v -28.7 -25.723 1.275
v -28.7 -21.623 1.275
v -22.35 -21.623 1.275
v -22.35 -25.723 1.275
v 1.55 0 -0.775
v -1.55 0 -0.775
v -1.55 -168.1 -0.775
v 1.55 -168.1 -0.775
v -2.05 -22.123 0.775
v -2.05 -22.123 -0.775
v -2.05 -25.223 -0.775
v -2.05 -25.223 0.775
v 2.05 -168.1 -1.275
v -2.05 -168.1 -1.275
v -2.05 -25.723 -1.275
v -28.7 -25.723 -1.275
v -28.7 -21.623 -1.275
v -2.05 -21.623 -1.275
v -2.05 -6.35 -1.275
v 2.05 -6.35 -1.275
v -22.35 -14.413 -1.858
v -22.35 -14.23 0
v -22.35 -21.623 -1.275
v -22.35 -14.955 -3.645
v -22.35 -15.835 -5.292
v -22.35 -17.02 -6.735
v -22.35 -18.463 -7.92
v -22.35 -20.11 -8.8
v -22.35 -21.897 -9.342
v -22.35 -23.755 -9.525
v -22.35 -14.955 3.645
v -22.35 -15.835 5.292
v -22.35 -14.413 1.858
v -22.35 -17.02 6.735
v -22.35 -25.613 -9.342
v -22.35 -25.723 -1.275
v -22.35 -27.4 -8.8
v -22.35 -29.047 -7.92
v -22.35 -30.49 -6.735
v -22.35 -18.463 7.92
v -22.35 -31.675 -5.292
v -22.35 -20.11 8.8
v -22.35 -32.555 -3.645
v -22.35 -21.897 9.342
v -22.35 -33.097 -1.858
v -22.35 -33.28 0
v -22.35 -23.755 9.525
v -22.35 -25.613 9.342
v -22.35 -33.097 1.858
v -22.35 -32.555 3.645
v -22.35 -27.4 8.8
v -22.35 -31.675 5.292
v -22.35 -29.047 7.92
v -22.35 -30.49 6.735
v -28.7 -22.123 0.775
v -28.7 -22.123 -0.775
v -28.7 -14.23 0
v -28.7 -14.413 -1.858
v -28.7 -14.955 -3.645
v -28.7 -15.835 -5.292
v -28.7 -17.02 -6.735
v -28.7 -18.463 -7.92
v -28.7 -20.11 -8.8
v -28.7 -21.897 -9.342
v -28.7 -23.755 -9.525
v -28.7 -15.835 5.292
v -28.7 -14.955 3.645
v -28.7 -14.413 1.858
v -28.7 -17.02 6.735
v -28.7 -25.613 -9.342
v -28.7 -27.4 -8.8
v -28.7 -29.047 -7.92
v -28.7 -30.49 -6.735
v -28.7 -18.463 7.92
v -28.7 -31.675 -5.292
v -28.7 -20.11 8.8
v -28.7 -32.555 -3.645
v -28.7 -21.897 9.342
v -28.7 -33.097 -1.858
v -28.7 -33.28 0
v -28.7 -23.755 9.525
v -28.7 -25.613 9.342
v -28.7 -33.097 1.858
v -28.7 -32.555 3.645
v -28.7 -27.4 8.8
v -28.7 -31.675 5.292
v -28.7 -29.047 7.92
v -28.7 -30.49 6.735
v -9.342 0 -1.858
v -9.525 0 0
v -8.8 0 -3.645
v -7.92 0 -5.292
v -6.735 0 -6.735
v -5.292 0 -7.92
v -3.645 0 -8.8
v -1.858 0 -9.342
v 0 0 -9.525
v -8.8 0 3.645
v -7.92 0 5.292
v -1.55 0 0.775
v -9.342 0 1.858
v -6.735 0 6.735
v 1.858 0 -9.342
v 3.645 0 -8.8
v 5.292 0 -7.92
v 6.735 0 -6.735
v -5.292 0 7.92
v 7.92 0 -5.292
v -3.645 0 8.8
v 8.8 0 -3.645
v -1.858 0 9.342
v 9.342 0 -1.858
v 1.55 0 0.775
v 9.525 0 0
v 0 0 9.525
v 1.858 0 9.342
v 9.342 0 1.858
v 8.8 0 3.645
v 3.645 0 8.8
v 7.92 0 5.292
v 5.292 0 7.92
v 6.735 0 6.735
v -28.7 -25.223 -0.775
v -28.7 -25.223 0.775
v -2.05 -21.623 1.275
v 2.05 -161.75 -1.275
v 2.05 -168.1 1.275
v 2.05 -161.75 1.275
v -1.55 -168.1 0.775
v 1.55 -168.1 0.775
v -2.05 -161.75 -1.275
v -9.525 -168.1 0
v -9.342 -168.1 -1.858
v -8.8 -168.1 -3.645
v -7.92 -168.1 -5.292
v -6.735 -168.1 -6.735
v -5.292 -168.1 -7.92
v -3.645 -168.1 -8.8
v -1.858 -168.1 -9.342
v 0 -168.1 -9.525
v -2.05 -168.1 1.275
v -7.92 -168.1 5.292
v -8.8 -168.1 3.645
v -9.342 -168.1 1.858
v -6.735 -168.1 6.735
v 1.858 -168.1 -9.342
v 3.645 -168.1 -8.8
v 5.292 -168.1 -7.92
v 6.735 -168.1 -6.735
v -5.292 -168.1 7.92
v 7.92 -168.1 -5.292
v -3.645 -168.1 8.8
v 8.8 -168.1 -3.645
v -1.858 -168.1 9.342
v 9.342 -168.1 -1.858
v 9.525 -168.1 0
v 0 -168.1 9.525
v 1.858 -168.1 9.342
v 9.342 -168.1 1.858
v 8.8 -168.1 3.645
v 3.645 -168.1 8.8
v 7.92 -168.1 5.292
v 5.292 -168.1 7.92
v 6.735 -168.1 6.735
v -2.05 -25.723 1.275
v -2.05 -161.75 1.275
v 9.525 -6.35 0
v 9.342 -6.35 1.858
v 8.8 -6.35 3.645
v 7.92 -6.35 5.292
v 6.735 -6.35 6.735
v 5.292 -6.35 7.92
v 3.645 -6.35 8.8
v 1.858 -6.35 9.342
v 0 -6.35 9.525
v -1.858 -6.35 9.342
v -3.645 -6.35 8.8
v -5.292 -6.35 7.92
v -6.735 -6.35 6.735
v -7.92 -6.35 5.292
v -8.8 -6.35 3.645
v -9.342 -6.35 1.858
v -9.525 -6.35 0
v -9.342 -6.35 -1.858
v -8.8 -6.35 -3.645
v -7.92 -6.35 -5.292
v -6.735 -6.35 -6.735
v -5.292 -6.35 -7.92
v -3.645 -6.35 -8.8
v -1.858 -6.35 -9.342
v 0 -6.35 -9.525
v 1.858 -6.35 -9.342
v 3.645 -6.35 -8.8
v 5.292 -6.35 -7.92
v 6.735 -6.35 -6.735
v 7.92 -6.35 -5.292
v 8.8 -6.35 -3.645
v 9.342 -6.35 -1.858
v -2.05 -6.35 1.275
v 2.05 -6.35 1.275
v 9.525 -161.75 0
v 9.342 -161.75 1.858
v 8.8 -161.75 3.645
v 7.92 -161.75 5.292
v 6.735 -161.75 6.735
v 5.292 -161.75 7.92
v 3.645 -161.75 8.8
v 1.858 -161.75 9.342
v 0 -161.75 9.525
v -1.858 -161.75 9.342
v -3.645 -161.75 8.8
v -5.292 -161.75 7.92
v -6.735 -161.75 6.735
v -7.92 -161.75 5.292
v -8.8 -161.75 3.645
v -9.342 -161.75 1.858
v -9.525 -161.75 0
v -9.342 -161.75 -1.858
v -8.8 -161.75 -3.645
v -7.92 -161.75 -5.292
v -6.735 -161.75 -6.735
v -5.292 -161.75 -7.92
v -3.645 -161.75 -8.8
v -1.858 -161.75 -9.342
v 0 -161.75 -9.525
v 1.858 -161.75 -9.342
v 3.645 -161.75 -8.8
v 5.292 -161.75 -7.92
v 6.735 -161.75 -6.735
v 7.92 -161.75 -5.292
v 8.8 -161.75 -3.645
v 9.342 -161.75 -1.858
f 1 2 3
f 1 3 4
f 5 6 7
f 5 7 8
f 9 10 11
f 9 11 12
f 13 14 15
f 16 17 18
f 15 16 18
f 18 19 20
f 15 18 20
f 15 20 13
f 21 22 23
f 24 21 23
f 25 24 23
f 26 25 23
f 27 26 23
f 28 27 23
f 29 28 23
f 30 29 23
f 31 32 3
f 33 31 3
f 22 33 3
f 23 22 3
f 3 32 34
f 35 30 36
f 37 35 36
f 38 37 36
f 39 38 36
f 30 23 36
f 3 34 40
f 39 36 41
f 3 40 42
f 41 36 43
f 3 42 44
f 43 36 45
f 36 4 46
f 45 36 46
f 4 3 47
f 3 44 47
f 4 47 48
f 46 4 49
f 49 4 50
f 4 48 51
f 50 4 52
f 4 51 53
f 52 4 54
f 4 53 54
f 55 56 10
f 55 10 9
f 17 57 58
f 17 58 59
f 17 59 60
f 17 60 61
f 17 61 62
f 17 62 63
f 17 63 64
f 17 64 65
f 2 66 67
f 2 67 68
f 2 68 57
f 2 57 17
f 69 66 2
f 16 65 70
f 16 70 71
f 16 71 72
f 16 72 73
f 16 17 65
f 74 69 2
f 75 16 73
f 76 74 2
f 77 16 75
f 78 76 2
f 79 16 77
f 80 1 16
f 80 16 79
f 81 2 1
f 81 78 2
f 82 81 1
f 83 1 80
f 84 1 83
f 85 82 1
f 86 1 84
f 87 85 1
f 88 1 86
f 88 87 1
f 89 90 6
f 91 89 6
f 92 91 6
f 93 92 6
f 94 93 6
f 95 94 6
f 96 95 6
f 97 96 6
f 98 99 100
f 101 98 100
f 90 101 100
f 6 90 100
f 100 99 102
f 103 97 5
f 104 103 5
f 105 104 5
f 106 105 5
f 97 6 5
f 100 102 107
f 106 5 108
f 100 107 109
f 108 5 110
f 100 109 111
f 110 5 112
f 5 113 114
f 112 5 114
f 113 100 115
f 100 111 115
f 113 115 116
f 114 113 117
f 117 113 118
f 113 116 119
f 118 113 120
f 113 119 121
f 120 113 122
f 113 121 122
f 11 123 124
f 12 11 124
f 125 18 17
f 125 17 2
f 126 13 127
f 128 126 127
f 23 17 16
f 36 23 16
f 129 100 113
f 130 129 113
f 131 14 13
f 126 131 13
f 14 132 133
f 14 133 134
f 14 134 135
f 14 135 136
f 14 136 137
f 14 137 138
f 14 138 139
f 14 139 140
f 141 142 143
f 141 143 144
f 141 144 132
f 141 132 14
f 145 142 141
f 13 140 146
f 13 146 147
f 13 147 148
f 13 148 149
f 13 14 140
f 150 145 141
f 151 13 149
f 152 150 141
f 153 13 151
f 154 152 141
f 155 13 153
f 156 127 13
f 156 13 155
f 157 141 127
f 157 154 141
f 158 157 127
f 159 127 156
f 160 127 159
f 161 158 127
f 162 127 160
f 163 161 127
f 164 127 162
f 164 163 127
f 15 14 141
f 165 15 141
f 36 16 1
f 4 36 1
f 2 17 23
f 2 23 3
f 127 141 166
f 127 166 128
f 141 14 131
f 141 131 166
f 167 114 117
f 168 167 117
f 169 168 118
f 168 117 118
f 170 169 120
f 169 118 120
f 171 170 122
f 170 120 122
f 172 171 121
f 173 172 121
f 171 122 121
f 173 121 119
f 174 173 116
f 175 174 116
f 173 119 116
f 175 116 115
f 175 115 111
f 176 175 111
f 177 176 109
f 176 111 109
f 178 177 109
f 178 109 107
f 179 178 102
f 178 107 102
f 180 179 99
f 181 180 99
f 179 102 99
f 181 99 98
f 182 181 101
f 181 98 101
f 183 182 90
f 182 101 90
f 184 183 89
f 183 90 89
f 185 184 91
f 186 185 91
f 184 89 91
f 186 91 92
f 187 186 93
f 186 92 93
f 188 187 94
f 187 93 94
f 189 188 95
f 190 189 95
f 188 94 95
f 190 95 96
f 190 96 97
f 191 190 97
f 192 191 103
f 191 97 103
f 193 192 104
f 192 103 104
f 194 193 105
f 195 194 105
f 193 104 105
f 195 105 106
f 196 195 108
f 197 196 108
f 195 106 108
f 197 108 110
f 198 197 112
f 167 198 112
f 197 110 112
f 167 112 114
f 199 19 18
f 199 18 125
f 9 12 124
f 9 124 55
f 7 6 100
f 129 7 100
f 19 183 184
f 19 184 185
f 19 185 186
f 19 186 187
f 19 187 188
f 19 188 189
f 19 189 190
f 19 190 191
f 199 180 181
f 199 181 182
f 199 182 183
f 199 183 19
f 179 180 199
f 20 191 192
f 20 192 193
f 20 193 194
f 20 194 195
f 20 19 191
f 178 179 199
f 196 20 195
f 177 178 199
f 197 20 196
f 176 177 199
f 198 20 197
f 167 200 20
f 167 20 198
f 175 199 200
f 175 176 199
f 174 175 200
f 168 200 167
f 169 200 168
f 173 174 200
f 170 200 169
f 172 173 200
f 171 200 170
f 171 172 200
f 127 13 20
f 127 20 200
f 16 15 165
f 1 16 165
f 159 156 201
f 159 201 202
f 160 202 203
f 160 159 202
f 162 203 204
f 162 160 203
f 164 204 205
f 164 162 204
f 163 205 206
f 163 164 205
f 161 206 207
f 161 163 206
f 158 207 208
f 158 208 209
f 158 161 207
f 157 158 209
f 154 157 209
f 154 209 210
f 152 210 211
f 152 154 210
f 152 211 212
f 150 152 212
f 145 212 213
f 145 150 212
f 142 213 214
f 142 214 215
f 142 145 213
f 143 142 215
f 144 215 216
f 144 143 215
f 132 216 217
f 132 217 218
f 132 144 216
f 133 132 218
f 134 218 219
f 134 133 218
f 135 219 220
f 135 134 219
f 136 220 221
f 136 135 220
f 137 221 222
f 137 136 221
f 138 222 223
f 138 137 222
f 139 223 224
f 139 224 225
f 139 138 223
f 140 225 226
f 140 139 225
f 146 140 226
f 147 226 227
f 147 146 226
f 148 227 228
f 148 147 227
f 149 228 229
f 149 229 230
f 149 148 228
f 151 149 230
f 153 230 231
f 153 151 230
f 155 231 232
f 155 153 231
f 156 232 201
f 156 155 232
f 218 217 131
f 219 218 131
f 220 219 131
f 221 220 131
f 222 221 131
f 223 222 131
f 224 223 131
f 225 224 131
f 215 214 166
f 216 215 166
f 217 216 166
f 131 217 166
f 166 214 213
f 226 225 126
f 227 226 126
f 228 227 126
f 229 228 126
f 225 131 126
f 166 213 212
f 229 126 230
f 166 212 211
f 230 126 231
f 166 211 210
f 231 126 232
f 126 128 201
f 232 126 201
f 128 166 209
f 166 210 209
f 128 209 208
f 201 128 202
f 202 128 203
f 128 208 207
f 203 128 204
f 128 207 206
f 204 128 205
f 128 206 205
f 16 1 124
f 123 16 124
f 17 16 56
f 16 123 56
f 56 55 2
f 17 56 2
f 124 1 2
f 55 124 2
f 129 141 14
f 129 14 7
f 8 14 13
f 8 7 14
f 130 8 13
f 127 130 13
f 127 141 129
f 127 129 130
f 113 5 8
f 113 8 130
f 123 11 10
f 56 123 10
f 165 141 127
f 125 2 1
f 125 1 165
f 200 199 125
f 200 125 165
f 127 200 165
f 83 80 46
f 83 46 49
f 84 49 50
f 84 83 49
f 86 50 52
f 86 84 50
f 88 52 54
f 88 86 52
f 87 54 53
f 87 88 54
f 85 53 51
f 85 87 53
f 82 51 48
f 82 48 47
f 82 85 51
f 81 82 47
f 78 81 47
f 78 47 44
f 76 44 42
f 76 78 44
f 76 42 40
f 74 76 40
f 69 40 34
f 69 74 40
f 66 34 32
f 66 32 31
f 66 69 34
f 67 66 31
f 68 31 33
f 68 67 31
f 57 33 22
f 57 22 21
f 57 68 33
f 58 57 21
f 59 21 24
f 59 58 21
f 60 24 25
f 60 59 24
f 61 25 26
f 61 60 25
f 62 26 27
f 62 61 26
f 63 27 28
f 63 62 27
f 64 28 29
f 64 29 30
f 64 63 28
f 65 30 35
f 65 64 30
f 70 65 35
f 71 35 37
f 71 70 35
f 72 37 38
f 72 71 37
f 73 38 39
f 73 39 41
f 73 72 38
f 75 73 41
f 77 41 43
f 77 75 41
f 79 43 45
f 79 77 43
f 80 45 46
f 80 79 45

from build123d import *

# Parameters (mm, degrees)
F0_W      = 4.1
F0_H      = 2.55
F0_W_2    = 3.1
F0_H_2    = 1.55
F2_DEPTH  = 168.1
F0_R      = 9.525
F3_DEPTH  = 6.35
F4_R      = 9.525
F4_W      = 4.1
F4_H      = 2.55
F5_DEPTH  = 6.35
F7_W      = 4.1
F7_H      = 2.55
F7_W_2    = 3.1
F7_H_2    = 1.55
F8_DEPTH  = 26.65
F9_R      = 9.525
F9_W      = 4.1
F9_H      = 2.55
F10_DEPTH = 6.35


with BuildPart() as f2:
    # F0 (on Front) → F2 (new body)
    with BuildSketch(Plane.XZ):
        Rectangle(F0_W, F0_H)
        Rectangle(F0_W_2, F0_H_2, mode=Mode.SUBTRACT)
    extrude(amount=F2_DEPTH)

    # F0 (on Front) → F3 (join)
    with BuildSketch(Plane.XZ):
        Circle(F0_R)
        Rectangle(F0_W, F0_H, mode=Mode.SUBTRACT)
    extrude(amount=F3_DEPTH)

    # F7 (on offset) → F8 (join)
    with BuildSketch(Plane.YZ.offset(-2.05)):
        with Locations((-23.6732278364, 0)):
            Rectangle(F7_W, F7_H)
        with Locations((-23.6732278364, 0)):
            Rectangle(F7_W_2, F7_H_2, mode=Mode.SUBTRACT)
    extrude(amount=-F8_DEPTH)


with BuildPart() as f5:
    # F4 (on face) → F5 (new body)
    with BuildSketch(Plane.XZ.offset(168.1)):
        Circle(F4_R)
        Rectangle(F4_W, F4_H, mode=Mode.SUBTRACT)
    extrude(amount=-F5_DEPTH)


with BuildPart() as f10:
    # F9 (on face) → F10 (new body)
    with BuildSketch(Plane(origin=(-28.7, 0, 0), x_dir=(0, -1, 0), z_dir=(-1, 0, 0))):
        with Locations((23.7548141568, 0)):
            Circle(F9_R)
        with Locations((23.6732278364, 0)):
            Rectangle(F9_W, F9_H, mode=Mode.SUBTRACT)
    extrude(amount=-F10_DEPTH)


solid = Compound([f2.part, f5.part, f10.part])
